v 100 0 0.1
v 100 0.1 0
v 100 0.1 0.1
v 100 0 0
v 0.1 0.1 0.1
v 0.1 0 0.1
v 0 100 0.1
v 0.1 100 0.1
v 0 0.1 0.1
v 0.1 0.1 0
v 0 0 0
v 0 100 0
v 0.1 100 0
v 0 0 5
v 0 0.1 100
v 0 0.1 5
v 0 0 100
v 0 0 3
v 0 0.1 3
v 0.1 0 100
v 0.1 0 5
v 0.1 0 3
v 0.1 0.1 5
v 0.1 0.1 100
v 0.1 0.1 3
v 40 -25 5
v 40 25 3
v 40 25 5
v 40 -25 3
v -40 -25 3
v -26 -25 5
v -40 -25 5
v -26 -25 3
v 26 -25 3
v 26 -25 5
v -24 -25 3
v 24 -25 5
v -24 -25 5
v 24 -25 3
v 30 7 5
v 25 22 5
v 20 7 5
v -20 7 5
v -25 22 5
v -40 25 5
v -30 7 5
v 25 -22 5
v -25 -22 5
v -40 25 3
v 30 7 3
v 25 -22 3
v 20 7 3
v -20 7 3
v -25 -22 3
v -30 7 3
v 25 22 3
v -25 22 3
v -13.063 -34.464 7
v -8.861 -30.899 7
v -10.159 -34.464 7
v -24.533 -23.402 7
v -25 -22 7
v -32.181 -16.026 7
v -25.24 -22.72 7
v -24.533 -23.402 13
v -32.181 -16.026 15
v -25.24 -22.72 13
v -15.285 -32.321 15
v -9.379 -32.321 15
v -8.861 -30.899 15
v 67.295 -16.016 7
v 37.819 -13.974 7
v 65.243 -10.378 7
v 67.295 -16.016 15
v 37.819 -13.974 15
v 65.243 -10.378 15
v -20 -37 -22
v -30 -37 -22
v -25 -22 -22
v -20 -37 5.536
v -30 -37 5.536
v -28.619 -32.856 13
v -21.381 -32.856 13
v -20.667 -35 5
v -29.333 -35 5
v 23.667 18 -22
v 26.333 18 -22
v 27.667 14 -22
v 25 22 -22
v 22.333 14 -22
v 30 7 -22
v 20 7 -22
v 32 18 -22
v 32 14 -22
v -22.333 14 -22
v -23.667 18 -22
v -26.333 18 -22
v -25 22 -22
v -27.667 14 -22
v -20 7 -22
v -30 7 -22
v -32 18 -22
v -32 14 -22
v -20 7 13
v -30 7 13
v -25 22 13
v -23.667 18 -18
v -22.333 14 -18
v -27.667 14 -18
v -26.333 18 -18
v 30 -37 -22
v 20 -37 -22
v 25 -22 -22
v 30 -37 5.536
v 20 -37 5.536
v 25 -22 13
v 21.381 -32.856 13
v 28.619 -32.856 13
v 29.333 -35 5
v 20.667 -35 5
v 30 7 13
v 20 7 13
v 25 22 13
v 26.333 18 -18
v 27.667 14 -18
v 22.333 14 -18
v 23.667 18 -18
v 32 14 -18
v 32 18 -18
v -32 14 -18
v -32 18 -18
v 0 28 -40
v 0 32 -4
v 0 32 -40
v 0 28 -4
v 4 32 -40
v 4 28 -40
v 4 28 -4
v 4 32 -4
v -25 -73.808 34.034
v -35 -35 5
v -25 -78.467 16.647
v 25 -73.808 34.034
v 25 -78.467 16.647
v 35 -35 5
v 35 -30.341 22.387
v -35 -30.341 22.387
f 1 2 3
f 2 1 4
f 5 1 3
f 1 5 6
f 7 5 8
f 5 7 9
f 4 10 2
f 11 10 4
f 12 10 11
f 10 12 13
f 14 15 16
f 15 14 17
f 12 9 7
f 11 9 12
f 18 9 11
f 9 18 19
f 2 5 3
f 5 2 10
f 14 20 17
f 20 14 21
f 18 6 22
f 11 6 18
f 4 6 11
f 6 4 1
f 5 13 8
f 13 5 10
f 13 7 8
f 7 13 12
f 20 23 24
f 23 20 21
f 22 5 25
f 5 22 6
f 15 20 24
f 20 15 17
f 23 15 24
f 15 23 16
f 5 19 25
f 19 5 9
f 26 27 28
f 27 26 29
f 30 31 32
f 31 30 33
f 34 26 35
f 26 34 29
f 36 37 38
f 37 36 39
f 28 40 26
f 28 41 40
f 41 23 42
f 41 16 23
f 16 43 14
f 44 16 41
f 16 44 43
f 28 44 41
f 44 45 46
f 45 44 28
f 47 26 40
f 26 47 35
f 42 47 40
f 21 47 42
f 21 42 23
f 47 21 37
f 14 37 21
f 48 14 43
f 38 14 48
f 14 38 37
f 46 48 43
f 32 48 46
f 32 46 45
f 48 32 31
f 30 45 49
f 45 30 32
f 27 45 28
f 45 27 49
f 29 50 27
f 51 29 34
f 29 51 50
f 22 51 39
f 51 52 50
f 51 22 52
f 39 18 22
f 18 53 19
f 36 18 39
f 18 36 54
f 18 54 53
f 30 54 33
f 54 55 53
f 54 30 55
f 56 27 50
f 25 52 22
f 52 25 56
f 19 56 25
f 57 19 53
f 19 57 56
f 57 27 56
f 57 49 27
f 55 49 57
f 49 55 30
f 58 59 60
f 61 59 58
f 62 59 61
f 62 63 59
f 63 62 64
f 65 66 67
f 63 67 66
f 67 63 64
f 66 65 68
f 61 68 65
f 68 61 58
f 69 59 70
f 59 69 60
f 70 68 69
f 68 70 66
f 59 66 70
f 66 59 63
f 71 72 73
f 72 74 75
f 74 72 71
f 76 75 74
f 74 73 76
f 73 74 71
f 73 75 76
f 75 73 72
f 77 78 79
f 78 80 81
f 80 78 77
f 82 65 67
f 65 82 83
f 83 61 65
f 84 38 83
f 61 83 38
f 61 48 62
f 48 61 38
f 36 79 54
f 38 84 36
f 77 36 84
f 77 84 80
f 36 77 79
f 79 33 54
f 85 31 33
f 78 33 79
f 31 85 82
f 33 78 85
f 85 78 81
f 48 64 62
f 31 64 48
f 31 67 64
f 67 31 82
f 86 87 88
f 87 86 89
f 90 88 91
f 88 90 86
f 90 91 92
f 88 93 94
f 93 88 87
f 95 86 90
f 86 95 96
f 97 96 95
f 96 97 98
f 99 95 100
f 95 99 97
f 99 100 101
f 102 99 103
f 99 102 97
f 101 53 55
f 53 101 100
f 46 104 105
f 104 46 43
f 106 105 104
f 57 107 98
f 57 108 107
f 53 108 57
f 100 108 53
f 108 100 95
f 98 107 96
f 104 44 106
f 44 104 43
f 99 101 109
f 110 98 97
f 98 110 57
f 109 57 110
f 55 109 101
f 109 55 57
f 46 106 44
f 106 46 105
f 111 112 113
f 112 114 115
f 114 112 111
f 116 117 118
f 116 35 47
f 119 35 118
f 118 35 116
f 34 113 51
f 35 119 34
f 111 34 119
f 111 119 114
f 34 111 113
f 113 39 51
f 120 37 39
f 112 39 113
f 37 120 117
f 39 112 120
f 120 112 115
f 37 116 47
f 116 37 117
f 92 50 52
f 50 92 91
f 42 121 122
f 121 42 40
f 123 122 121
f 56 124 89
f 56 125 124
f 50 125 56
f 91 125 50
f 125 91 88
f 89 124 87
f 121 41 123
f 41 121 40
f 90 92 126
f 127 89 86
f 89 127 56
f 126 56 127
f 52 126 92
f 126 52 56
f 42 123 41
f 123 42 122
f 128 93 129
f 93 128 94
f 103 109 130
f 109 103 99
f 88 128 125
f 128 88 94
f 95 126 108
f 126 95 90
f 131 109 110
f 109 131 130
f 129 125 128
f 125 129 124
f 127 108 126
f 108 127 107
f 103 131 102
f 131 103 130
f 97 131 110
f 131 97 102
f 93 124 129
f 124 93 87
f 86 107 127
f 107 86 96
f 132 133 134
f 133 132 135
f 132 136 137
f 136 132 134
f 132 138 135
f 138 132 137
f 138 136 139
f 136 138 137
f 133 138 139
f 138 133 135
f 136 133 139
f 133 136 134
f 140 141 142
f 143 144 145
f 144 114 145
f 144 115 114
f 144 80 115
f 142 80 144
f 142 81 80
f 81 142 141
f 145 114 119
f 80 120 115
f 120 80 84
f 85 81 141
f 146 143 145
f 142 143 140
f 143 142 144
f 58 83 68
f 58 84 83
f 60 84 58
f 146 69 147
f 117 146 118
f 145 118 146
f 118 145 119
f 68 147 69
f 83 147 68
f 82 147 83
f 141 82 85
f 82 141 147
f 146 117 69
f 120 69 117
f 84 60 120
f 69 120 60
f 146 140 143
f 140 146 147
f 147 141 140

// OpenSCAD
    // Combined Scene

    // Permanent Model
    
    // Permanent Model (Black)
    color([0, 0, 0]) {
        // Your permanent model code here
        cube([100,0.1,0.1], center = false);
        cube([0.1,100,0.1], center = false);
        cube([0.1,0.1,100], center = false);
    }
    

    // Dynamic Model
    translate([0, 0, 0]) {
    // Cushioned Seat
    difference() {
        translate([0, 0, 0]) 
            linear_extrude(height=5) 
                polygon(points=[[-40, 25], [40, 25], [40, -25], [-40, -25]]);
        translate([0, 0, -1]) 
            cube([80, 50, 8], center=true);
    }

    // Ergonomic Backrest
    translate([0, -35, 5])
        rotate([-15, 0, 0])
        linear_extrude(height=18) 
            polygon(points=[[-35, 0], [35, 0], [25, -45], [-25, -45]]);

    // Stylish Armrests
    for (x = [-35, 35]) {
        translate([x, -15, 7]) {
            rotate([0, 0, x > 0 ? 20 : -20])
                linear_extrude(height=8) 
                    polygon(points=[[3, 0], [30, -12], [30, -6], [3, 0]]);
        }
    }

    // Tapered Legs
    for (i = [-1, 1]) {
        for (j = [-1, 1]) {
            translate([i * 25, j * 22, -22]) {
                rotate([0, 0, 0])
                    linear_extrude(height=35) 
                        polygon(points=[[0, 0], [-5, -15], [5, -15]]);
            }
        }
    }

    // Cross Support Structure
    translate([0, 0, -22]) {
        linear_extrude(height=4) 
            polygon(points=[[-32, 18], [32, 18], [32, 14], [-32, 14]]);
        rotate([0, 90, 0]) 
            linear_extrude(height=4) 
                polygon(points=[[-18, 32], [18, 32], [18, 28], [-18, 28]]);
    }

    // Seat Detail
    translate([0, 0, 0]) {
        difference() {
            translate([0, 0, 1]) 
                linear_extrude(height=4) 
                    polygon(points=[[-32, 20], [32, 20], [32, -20], [-32, -20]]);
            translate([0, 0, -1]) 
                cube([64, 40, 10], center=true);
        }
    }
}
    
